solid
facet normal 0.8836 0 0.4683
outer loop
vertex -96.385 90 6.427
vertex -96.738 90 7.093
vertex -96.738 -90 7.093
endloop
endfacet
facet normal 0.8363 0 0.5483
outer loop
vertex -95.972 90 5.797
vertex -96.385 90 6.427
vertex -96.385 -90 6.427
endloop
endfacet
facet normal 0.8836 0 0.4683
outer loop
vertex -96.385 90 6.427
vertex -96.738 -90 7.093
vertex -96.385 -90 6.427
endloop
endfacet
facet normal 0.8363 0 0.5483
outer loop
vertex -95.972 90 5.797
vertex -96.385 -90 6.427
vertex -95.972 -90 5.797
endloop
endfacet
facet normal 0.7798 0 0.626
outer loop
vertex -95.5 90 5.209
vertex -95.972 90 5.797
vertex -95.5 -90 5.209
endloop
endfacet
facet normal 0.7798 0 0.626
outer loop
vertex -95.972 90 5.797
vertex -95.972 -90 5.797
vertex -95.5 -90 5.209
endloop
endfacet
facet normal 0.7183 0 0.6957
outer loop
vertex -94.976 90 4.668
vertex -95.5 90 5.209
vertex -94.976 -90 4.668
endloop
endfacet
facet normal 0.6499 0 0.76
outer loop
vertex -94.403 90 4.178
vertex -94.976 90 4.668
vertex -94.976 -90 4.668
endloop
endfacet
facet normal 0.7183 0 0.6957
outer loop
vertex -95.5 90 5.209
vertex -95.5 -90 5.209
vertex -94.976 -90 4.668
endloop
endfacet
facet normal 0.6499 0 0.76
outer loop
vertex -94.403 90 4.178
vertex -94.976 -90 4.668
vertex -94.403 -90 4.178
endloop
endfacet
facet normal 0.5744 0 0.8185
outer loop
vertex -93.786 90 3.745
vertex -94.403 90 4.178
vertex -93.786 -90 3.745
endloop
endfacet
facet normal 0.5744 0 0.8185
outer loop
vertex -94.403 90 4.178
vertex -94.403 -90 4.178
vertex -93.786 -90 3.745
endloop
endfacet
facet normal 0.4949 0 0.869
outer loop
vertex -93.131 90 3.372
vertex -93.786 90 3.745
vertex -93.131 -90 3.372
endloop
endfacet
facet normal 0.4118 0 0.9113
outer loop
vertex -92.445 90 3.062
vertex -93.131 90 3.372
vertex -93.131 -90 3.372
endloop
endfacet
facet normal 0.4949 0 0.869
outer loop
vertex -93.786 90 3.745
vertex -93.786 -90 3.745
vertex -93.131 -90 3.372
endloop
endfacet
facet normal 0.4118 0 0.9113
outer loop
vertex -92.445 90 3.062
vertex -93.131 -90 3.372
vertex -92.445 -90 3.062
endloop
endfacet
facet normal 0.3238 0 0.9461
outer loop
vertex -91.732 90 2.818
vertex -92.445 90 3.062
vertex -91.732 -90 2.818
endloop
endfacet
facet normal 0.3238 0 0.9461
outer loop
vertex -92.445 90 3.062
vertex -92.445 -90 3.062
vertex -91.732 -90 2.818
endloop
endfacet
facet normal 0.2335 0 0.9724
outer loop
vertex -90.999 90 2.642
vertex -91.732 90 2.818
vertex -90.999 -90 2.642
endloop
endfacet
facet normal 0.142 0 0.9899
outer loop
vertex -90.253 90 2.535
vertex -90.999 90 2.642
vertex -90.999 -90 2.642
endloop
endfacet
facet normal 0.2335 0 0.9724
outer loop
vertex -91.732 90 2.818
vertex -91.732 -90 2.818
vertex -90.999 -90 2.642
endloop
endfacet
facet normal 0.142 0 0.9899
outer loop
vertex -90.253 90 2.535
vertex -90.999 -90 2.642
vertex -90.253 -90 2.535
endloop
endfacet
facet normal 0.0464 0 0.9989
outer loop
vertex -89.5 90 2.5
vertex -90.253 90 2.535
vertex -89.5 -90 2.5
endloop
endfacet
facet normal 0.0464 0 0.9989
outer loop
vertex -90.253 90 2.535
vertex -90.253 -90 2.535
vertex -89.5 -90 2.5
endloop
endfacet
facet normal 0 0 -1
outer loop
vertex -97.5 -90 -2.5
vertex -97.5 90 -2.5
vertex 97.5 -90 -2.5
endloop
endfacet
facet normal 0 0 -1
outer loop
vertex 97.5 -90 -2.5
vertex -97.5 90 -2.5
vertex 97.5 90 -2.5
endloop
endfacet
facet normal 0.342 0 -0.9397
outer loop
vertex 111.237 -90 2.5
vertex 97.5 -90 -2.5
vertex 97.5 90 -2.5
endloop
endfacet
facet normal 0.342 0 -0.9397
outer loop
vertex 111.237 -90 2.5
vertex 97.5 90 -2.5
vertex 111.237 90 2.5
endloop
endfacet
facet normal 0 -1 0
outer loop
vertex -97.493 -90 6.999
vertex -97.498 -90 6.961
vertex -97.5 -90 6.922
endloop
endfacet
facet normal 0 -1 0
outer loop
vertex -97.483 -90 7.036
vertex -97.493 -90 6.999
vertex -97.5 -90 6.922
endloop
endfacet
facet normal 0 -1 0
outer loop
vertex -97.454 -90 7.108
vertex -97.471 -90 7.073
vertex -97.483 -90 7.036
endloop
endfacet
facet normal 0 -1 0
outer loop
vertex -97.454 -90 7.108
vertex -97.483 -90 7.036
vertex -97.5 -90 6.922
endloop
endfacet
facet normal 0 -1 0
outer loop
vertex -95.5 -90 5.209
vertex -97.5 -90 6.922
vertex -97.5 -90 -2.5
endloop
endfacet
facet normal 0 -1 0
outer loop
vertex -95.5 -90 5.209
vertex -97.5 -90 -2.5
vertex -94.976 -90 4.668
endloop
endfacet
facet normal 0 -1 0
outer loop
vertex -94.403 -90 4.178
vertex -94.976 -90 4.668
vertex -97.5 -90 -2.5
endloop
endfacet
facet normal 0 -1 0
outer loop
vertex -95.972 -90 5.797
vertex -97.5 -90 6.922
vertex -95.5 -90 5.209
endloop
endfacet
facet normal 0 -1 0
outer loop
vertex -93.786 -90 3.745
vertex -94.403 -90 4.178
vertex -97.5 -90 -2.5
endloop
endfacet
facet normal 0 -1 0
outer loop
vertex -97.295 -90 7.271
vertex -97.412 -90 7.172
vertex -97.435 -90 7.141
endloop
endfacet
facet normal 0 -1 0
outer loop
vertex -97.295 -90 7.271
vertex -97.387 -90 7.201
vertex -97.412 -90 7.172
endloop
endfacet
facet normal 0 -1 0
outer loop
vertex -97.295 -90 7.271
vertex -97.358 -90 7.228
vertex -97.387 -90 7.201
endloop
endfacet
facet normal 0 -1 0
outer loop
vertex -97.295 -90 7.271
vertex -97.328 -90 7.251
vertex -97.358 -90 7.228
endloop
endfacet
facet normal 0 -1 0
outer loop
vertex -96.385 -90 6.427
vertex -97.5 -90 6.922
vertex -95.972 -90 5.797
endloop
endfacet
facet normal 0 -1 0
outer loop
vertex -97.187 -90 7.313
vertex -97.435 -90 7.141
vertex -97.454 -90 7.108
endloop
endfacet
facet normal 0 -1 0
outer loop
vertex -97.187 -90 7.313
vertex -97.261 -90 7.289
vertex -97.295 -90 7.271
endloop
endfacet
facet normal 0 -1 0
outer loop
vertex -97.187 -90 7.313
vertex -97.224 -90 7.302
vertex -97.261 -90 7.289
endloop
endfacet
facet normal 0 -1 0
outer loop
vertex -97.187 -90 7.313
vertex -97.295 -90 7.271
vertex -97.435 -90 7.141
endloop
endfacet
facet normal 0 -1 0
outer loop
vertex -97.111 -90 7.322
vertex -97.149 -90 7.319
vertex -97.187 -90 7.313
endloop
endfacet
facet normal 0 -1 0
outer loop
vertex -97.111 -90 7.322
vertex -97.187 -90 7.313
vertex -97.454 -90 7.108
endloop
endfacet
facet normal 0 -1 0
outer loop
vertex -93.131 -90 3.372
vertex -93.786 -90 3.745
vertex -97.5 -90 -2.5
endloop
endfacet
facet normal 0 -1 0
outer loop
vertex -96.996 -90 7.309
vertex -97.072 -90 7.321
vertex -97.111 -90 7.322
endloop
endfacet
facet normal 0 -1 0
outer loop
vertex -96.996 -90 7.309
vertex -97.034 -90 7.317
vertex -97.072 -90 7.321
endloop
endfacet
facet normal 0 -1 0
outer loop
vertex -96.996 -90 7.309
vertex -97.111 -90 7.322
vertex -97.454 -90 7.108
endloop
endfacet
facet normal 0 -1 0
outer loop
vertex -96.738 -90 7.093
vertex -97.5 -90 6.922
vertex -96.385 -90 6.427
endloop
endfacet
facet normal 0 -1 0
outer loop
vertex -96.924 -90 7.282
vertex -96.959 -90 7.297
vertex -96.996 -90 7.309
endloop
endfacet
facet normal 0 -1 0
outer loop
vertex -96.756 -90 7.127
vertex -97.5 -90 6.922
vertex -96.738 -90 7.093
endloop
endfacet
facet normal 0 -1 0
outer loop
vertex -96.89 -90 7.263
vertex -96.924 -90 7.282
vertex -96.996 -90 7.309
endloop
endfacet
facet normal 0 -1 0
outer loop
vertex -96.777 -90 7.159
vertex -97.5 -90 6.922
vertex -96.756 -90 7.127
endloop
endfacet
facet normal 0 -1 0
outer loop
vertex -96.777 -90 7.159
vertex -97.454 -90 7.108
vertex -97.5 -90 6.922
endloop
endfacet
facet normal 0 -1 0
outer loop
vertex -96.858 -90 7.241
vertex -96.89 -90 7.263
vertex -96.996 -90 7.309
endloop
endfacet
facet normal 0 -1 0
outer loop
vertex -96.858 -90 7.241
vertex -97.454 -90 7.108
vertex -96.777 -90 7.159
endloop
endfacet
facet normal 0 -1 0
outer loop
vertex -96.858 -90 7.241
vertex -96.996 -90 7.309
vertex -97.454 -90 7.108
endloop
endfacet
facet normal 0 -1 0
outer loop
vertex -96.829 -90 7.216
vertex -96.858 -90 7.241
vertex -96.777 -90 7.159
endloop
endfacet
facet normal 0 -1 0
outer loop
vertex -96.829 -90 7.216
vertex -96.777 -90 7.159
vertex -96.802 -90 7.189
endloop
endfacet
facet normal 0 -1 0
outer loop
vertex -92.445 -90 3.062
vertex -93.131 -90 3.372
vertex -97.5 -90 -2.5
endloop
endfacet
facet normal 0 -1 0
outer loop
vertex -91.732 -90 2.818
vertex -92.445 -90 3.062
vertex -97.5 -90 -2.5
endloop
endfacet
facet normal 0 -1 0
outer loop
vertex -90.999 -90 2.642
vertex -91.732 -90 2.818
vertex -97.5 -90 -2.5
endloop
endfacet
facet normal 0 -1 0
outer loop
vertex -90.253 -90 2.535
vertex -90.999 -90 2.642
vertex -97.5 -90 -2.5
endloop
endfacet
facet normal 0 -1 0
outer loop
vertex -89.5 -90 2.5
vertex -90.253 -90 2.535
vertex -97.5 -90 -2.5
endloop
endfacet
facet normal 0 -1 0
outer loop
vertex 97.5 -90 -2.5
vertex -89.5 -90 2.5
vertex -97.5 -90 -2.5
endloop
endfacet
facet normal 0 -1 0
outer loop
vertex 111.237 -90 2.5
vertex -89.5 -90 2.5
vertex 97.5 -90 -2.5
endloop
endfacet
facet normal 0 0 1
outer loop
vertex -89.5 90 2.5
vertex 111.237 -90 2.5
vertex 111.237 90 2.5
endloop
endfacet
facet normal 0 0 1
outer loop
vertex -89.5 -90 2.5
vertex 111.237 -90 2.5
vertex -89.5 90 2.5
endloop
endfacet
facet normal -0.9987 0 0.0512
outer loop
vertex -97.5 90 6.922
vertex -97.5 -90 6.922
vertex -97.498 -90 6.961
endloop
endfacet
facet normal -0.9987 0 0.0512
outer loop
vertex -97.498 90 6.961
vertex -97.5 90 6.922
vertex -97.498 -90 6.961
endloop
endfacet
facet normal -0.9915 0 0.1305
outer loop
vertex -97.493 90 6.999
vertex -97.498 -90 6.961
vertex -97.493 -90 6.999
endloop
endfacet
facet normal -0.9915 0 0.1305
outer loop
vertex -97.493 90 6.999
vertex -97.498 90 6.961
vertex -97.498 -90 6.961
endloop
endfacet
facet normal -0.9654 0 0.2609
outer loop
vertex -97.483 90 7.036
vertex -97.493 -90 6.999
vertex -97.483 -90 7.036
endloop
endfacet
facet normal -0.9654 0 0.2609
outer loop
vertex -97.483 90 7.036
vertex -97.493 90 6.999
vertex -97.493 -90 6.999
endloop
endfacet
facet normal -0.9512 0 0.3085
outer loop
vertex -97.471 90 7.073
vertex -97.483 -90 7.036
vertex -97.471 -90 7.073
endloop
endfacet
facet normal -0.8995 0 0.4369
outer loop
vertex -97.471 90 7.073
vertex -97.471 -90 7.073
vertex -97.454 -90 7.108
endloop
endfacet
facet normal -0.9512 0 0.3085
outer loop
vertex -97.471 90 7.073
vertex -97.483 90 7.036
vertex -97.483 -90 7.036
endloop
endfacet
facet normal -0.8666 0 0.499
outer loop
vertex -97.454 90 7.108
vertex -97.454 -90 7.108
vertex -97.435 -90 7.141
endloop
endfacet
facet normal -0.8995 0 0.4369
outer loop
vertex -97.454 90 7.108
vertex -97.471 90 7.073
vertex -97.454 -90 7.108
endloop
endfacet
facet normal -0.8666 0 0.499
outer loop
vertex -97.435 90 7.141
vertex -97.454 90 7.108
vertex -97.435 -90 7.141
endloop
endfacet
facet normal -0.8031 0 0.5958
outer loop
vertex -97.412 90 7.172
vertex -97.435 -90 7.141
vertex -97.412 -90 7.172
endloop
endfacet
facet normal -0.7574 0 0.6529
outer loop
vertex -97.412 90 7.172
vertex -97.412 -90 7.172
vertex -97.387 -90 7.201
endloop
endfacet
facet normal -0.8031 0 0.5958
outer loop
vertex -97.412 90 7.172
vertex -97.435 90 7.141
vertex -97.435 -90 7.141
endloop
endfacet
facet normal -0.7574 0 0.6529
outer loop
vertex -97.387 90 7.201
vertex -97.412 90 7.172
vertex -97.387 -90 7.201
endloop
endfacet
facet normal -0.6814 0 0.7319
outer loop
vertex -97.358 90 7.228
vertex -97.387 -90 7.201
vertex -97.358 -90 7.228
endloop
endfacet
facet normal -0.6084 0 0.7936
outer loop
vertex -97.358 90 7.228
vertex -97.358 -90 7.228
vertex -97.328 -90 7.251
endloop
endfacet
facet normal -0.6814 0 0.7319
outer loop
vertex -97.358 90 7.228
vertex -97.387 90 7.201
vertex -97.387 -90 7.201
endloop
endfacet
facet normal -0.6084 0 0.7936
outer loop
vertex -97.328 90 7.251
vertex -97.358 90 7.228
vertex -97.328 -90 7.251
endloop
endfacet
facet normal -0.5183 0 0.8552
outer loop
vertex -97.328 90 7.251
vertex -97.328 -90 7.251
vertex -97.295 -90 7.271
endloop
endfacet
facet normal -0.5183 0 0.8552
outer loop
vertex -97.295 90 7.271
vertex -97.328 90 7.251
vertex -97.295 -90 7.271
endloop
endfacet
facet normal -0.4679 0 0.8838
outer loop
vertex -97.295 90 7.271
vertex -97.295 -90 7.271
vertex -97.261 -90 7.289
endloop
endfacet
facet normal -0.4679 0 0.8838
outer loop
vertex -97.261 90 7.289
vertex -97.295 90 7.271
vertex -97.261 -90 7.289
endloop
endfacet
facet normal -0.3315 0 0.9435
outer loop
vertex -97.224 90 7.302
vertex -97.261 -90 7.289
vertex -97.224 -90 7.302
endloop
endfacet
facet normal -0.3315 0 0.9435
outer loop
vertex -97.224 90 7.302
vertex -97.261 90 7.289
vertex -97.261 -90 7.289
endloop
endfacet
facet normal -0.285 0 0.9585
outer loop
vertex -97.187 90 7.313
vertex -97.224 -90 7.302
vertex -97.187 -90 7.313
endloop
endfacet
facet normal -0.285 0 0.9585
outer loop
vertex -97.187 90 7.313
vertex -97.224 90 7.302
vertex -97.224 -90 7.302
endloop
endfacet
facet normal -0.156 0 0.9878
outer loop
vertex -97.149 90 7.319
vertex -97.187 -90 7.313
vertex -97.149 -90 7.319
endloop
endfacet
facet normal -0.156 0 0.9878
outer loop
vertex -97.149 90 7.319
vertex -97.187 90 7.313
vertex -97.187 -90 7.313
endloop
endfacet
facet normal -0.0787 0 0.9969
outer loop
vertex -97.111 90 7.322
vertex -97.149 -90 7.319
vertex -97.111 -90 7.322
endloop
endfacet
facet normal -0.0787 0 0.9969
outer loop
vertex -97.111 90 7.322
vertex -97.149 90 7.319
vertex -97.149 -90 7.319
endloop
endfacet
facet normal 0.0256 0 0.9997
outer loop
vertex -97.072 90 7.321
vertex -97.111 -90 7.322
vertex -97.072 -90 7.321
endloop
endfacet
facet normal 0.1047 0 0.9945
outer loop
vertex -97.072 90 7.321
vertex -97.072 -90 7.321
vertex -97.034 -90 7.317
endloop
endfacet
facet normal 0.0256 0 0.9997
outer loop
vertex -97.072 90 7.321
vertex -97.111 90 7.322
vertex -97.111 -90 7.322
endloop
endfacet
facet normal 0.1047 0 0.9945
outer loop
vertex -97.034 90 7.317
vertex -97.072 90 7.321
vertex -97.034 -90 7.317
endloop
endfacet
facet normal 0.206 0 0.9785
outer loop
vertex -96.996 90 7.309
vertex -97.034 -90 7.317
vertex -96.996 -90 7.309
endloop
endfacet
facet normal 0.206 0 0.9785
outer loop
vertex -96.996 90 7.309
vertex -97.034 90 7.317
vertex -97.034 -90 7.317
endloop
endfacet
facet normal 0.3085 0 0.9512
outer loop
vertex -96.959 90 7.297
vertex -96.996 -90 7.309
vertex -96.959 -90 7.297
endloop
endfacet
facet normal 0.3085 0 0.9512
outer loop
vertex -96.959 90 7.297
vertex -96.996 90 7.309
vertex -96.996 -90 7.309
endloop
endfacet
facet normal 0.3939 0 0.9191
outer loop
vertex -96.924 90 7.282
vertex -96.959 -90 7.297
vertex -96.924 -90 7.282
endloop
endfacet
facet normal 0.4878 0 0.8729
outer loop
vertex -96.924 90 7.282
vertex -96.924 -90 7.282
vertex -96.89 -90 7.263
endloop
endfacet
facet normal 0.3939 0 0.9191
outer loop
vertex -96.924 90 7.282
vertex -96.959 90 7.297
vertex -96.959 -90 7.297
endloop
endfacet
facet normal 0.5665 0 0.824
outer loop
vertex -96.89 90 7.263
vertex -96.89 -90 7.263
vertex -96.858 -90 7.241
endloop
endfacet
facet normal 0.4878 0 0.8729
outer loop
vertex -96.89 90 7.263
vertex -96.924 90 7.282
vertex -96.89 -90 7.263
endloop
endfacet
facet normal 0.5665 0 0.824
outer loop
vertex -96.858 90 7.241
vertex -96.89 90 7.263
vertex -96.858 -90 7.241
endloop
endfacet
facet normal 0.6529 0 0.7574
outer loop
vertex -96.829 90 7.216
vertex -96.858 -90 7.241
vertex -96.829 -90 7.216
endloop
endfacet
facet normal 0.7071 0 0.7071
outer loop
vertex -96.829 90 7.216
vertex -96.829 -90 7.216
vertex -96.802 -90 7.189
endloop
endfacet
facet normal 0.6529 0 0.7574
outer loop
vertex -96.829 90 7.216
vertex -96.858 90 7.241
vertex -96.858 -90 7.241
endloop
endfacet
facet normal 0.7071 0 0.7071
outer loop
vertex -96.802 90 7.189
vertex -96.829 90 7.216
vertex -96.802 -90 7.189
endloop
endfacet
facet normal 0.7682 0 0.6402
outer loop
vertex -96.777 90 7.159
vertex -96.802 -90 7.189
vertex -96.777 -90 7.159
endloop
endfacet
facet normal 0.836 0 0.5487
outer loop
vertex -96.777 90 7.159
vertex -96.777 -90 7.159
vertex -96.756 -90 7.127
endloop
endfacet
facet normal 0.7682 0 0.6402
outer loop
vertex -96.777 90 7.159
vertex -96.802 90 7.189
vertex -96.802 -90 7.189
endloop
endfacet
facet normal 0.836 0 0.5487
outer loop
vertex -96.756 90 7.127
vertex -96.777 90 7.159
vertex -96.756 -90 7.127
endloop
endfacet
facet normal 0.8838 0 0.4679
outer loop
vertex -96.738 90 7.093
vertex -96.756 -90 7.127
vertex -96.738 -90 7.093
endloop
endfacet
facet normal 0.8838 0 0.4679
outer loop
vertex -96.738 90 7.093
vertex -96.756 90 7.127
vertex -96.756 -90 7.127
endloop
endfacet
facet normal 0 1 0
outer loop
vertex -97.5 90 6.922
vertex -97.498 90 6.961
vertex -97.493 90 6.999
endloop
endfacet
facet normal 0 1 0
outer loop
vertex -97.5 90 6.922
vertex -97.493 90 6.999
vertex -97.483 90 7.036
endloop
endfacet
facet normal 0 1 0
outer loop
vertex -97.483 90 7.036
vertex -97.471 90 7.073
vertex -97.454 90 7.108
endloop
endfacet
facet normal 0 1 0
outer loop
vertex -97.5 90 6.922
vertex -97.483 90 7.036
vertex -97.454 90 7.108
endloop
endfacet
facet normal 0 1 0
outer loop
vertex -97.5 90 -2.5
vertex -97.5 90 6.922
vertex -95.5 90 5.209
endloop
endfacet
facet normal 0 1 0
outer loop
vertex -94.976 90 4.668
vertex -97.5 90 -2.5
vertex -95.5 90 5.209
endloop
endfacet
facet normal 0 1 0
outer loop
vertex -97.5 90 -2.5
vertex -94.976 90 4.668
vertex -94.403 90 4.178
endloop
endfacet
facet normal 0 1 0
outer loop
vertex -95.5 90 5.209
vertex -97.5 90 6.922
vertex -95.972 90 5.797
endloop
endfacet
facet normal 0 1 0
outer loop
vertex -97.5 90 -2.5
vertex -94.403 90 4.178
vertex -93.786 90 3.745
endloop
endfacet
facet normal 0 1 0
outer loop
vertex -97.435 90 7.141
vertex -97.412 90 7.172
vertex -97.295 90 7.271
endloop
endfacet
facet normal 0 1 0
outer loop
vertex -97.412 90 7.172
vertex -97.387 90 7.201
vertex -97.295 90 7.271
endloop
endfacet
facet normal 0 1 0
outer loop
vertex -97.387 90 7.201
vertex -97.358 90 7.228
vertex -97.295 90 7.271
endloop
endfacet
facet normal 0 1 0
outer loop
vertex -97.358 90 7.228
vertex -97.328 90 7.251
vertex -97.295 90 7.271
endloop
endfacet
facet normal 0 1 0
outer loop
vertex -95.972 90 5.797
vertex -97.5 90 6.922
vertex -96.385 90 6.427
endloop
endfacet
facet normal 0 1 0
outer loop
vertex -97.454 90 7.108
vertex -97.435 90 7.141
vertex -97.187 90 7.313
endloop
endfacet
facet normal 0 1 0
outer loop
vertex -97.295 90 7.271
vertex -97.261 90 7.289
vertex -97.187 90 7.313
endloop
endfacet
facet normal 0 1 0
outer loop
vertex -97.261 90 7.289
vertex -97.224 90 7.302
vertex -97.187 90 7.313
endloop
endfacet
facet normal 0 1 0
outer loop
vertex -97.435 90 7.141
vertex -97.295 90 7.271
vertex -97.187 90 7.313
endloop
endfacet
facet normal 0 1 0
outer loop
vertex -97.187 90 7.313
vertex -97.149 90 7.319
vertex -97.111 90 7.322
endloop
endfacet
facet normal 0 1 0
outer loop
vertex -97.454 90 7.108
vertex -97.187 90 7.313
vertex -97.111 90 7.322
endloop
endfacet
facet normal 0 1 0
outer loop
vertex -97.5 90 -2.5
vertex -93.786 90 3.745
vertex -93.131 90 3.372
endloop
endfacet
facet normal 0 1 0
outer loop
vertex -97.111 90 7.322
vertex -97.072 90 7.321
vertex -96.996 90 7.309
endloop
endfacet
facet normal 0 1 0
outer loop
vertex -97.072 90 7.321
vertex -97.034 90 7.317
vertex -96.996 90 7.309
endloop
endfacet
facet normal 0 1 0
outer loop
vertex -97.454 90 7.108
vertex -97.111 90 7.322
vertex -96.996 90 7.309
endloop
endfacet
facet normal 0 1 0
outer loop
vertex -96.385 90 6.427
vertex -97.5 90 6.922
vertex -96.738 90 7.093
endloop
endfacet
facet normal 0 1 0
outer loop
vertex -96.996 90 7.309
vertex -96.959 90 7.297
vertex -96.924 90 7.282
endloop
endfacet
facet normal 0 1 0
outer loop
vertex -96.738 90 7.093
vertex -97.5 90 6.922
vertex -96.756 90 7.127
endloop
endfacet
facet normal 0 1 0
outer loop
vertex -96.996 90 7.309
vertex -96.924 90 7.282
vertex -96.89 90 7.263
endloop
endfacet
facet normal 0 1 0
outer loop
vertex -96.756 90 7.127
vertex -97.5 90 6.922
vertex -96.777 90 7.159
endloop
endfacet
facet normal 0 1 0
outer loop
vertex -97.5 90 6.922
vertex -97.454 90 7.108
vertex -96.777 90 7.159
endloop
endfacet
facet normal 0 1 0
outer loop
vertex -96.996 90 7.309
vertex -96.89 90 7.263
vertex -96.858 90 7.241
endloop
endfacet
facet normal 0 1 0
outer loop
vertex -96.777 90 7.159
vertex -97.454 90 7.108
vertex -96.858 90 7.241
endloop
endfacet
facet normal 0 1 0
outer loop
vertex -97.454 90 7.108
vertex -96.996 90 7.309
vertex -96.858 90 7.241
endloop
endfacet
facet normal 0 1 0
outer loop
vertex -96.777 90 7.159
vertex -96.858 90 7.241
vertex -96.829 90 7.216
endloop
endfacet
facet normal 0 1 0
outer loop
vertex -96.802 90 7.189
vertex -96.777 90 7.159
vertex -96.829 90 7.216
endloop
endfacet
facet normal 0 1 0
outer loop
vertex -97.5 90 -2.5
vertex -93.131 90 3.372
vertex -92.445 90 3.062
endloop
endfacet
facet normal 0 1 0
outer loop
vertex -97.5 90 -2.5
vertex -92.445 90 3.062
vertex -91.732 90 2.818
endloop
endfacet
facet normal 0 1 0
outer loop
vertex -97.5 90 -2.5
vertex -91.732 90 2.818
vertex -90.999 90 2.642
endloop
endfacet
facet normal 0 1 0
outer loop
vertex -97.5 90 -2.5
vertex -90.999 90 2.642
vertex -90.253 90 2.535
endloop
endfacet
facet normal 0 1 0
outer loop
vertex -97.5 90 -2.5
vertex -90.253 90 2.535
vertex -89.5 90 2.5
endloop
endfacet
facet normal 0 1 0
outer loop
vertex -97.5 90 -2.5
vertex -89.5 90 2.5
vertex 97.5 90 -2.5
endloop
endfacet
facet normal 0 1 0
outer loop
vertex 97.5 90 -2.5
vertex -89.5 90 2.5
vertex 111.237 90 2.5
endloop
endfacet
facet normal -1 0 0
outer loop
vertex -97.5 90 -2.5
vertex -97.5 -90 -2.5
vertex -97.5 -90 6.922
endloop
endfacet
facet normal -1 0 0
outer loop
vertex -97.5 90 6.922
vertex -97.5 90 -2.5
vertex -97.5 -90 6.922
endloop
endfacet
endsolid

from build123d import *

# Parameters (mm, degrees)
SKETCH1_W           = 195
SKETCH1_H           = 180
BOSS_EXTRUDE1_DEPTH = 2.5
BOSS_EXTRUDE3_DEPTH = 180
BOSS_EXTRUDE4_DEPTH = 180
FILLET1_R           = 0.4


with BuildPart() as part:
    # Sketch1 → Boss-Extrude1 (new body, symmetric)
    with BuildSketch(Plane.XY):
        Rectangle(SKETCH1_W, SKETCH1_H)
    extrude(amount=BOSS_EXTRUDE1_DEPTH, both=True)

    # Sketch4 → Boss-Extrude3 (add)
    with BuildSketch(Plane.XZ.offset(90)):
        with BuildLine():
            Line((-97.5, 2.5), (-97.5, 10.5))
            ThreePointArc((-97.5, 10.5), (-95.156854249, 4.843145751), (-89.5, 2.5))
            Line((-89.5, 2.5), (-97.5, 2.5))
        make_face()
    extrude(amount=-BOSS_EXTRUDE3_DEPTH)

    # Sketch5 → Boss-Extrude4 (add)
    with BuildSketch(Plane.XZ.offset(90)):
        Polygon((97.5, 2.5), (97.5, -2.5), (111.237387097, 2.5), align=None)
    extrude(amount=-BOSS_EXTRUDE4_DEPTH)

    # Fillet1
    fillet1_edges = [part.edges().sort_by_distance(p)[0] for p in [
        (-97.5, 0, 10.5),
    ]]
    fillet(fillet1_edges, radius=FILLET1_R)


solid = part.part
